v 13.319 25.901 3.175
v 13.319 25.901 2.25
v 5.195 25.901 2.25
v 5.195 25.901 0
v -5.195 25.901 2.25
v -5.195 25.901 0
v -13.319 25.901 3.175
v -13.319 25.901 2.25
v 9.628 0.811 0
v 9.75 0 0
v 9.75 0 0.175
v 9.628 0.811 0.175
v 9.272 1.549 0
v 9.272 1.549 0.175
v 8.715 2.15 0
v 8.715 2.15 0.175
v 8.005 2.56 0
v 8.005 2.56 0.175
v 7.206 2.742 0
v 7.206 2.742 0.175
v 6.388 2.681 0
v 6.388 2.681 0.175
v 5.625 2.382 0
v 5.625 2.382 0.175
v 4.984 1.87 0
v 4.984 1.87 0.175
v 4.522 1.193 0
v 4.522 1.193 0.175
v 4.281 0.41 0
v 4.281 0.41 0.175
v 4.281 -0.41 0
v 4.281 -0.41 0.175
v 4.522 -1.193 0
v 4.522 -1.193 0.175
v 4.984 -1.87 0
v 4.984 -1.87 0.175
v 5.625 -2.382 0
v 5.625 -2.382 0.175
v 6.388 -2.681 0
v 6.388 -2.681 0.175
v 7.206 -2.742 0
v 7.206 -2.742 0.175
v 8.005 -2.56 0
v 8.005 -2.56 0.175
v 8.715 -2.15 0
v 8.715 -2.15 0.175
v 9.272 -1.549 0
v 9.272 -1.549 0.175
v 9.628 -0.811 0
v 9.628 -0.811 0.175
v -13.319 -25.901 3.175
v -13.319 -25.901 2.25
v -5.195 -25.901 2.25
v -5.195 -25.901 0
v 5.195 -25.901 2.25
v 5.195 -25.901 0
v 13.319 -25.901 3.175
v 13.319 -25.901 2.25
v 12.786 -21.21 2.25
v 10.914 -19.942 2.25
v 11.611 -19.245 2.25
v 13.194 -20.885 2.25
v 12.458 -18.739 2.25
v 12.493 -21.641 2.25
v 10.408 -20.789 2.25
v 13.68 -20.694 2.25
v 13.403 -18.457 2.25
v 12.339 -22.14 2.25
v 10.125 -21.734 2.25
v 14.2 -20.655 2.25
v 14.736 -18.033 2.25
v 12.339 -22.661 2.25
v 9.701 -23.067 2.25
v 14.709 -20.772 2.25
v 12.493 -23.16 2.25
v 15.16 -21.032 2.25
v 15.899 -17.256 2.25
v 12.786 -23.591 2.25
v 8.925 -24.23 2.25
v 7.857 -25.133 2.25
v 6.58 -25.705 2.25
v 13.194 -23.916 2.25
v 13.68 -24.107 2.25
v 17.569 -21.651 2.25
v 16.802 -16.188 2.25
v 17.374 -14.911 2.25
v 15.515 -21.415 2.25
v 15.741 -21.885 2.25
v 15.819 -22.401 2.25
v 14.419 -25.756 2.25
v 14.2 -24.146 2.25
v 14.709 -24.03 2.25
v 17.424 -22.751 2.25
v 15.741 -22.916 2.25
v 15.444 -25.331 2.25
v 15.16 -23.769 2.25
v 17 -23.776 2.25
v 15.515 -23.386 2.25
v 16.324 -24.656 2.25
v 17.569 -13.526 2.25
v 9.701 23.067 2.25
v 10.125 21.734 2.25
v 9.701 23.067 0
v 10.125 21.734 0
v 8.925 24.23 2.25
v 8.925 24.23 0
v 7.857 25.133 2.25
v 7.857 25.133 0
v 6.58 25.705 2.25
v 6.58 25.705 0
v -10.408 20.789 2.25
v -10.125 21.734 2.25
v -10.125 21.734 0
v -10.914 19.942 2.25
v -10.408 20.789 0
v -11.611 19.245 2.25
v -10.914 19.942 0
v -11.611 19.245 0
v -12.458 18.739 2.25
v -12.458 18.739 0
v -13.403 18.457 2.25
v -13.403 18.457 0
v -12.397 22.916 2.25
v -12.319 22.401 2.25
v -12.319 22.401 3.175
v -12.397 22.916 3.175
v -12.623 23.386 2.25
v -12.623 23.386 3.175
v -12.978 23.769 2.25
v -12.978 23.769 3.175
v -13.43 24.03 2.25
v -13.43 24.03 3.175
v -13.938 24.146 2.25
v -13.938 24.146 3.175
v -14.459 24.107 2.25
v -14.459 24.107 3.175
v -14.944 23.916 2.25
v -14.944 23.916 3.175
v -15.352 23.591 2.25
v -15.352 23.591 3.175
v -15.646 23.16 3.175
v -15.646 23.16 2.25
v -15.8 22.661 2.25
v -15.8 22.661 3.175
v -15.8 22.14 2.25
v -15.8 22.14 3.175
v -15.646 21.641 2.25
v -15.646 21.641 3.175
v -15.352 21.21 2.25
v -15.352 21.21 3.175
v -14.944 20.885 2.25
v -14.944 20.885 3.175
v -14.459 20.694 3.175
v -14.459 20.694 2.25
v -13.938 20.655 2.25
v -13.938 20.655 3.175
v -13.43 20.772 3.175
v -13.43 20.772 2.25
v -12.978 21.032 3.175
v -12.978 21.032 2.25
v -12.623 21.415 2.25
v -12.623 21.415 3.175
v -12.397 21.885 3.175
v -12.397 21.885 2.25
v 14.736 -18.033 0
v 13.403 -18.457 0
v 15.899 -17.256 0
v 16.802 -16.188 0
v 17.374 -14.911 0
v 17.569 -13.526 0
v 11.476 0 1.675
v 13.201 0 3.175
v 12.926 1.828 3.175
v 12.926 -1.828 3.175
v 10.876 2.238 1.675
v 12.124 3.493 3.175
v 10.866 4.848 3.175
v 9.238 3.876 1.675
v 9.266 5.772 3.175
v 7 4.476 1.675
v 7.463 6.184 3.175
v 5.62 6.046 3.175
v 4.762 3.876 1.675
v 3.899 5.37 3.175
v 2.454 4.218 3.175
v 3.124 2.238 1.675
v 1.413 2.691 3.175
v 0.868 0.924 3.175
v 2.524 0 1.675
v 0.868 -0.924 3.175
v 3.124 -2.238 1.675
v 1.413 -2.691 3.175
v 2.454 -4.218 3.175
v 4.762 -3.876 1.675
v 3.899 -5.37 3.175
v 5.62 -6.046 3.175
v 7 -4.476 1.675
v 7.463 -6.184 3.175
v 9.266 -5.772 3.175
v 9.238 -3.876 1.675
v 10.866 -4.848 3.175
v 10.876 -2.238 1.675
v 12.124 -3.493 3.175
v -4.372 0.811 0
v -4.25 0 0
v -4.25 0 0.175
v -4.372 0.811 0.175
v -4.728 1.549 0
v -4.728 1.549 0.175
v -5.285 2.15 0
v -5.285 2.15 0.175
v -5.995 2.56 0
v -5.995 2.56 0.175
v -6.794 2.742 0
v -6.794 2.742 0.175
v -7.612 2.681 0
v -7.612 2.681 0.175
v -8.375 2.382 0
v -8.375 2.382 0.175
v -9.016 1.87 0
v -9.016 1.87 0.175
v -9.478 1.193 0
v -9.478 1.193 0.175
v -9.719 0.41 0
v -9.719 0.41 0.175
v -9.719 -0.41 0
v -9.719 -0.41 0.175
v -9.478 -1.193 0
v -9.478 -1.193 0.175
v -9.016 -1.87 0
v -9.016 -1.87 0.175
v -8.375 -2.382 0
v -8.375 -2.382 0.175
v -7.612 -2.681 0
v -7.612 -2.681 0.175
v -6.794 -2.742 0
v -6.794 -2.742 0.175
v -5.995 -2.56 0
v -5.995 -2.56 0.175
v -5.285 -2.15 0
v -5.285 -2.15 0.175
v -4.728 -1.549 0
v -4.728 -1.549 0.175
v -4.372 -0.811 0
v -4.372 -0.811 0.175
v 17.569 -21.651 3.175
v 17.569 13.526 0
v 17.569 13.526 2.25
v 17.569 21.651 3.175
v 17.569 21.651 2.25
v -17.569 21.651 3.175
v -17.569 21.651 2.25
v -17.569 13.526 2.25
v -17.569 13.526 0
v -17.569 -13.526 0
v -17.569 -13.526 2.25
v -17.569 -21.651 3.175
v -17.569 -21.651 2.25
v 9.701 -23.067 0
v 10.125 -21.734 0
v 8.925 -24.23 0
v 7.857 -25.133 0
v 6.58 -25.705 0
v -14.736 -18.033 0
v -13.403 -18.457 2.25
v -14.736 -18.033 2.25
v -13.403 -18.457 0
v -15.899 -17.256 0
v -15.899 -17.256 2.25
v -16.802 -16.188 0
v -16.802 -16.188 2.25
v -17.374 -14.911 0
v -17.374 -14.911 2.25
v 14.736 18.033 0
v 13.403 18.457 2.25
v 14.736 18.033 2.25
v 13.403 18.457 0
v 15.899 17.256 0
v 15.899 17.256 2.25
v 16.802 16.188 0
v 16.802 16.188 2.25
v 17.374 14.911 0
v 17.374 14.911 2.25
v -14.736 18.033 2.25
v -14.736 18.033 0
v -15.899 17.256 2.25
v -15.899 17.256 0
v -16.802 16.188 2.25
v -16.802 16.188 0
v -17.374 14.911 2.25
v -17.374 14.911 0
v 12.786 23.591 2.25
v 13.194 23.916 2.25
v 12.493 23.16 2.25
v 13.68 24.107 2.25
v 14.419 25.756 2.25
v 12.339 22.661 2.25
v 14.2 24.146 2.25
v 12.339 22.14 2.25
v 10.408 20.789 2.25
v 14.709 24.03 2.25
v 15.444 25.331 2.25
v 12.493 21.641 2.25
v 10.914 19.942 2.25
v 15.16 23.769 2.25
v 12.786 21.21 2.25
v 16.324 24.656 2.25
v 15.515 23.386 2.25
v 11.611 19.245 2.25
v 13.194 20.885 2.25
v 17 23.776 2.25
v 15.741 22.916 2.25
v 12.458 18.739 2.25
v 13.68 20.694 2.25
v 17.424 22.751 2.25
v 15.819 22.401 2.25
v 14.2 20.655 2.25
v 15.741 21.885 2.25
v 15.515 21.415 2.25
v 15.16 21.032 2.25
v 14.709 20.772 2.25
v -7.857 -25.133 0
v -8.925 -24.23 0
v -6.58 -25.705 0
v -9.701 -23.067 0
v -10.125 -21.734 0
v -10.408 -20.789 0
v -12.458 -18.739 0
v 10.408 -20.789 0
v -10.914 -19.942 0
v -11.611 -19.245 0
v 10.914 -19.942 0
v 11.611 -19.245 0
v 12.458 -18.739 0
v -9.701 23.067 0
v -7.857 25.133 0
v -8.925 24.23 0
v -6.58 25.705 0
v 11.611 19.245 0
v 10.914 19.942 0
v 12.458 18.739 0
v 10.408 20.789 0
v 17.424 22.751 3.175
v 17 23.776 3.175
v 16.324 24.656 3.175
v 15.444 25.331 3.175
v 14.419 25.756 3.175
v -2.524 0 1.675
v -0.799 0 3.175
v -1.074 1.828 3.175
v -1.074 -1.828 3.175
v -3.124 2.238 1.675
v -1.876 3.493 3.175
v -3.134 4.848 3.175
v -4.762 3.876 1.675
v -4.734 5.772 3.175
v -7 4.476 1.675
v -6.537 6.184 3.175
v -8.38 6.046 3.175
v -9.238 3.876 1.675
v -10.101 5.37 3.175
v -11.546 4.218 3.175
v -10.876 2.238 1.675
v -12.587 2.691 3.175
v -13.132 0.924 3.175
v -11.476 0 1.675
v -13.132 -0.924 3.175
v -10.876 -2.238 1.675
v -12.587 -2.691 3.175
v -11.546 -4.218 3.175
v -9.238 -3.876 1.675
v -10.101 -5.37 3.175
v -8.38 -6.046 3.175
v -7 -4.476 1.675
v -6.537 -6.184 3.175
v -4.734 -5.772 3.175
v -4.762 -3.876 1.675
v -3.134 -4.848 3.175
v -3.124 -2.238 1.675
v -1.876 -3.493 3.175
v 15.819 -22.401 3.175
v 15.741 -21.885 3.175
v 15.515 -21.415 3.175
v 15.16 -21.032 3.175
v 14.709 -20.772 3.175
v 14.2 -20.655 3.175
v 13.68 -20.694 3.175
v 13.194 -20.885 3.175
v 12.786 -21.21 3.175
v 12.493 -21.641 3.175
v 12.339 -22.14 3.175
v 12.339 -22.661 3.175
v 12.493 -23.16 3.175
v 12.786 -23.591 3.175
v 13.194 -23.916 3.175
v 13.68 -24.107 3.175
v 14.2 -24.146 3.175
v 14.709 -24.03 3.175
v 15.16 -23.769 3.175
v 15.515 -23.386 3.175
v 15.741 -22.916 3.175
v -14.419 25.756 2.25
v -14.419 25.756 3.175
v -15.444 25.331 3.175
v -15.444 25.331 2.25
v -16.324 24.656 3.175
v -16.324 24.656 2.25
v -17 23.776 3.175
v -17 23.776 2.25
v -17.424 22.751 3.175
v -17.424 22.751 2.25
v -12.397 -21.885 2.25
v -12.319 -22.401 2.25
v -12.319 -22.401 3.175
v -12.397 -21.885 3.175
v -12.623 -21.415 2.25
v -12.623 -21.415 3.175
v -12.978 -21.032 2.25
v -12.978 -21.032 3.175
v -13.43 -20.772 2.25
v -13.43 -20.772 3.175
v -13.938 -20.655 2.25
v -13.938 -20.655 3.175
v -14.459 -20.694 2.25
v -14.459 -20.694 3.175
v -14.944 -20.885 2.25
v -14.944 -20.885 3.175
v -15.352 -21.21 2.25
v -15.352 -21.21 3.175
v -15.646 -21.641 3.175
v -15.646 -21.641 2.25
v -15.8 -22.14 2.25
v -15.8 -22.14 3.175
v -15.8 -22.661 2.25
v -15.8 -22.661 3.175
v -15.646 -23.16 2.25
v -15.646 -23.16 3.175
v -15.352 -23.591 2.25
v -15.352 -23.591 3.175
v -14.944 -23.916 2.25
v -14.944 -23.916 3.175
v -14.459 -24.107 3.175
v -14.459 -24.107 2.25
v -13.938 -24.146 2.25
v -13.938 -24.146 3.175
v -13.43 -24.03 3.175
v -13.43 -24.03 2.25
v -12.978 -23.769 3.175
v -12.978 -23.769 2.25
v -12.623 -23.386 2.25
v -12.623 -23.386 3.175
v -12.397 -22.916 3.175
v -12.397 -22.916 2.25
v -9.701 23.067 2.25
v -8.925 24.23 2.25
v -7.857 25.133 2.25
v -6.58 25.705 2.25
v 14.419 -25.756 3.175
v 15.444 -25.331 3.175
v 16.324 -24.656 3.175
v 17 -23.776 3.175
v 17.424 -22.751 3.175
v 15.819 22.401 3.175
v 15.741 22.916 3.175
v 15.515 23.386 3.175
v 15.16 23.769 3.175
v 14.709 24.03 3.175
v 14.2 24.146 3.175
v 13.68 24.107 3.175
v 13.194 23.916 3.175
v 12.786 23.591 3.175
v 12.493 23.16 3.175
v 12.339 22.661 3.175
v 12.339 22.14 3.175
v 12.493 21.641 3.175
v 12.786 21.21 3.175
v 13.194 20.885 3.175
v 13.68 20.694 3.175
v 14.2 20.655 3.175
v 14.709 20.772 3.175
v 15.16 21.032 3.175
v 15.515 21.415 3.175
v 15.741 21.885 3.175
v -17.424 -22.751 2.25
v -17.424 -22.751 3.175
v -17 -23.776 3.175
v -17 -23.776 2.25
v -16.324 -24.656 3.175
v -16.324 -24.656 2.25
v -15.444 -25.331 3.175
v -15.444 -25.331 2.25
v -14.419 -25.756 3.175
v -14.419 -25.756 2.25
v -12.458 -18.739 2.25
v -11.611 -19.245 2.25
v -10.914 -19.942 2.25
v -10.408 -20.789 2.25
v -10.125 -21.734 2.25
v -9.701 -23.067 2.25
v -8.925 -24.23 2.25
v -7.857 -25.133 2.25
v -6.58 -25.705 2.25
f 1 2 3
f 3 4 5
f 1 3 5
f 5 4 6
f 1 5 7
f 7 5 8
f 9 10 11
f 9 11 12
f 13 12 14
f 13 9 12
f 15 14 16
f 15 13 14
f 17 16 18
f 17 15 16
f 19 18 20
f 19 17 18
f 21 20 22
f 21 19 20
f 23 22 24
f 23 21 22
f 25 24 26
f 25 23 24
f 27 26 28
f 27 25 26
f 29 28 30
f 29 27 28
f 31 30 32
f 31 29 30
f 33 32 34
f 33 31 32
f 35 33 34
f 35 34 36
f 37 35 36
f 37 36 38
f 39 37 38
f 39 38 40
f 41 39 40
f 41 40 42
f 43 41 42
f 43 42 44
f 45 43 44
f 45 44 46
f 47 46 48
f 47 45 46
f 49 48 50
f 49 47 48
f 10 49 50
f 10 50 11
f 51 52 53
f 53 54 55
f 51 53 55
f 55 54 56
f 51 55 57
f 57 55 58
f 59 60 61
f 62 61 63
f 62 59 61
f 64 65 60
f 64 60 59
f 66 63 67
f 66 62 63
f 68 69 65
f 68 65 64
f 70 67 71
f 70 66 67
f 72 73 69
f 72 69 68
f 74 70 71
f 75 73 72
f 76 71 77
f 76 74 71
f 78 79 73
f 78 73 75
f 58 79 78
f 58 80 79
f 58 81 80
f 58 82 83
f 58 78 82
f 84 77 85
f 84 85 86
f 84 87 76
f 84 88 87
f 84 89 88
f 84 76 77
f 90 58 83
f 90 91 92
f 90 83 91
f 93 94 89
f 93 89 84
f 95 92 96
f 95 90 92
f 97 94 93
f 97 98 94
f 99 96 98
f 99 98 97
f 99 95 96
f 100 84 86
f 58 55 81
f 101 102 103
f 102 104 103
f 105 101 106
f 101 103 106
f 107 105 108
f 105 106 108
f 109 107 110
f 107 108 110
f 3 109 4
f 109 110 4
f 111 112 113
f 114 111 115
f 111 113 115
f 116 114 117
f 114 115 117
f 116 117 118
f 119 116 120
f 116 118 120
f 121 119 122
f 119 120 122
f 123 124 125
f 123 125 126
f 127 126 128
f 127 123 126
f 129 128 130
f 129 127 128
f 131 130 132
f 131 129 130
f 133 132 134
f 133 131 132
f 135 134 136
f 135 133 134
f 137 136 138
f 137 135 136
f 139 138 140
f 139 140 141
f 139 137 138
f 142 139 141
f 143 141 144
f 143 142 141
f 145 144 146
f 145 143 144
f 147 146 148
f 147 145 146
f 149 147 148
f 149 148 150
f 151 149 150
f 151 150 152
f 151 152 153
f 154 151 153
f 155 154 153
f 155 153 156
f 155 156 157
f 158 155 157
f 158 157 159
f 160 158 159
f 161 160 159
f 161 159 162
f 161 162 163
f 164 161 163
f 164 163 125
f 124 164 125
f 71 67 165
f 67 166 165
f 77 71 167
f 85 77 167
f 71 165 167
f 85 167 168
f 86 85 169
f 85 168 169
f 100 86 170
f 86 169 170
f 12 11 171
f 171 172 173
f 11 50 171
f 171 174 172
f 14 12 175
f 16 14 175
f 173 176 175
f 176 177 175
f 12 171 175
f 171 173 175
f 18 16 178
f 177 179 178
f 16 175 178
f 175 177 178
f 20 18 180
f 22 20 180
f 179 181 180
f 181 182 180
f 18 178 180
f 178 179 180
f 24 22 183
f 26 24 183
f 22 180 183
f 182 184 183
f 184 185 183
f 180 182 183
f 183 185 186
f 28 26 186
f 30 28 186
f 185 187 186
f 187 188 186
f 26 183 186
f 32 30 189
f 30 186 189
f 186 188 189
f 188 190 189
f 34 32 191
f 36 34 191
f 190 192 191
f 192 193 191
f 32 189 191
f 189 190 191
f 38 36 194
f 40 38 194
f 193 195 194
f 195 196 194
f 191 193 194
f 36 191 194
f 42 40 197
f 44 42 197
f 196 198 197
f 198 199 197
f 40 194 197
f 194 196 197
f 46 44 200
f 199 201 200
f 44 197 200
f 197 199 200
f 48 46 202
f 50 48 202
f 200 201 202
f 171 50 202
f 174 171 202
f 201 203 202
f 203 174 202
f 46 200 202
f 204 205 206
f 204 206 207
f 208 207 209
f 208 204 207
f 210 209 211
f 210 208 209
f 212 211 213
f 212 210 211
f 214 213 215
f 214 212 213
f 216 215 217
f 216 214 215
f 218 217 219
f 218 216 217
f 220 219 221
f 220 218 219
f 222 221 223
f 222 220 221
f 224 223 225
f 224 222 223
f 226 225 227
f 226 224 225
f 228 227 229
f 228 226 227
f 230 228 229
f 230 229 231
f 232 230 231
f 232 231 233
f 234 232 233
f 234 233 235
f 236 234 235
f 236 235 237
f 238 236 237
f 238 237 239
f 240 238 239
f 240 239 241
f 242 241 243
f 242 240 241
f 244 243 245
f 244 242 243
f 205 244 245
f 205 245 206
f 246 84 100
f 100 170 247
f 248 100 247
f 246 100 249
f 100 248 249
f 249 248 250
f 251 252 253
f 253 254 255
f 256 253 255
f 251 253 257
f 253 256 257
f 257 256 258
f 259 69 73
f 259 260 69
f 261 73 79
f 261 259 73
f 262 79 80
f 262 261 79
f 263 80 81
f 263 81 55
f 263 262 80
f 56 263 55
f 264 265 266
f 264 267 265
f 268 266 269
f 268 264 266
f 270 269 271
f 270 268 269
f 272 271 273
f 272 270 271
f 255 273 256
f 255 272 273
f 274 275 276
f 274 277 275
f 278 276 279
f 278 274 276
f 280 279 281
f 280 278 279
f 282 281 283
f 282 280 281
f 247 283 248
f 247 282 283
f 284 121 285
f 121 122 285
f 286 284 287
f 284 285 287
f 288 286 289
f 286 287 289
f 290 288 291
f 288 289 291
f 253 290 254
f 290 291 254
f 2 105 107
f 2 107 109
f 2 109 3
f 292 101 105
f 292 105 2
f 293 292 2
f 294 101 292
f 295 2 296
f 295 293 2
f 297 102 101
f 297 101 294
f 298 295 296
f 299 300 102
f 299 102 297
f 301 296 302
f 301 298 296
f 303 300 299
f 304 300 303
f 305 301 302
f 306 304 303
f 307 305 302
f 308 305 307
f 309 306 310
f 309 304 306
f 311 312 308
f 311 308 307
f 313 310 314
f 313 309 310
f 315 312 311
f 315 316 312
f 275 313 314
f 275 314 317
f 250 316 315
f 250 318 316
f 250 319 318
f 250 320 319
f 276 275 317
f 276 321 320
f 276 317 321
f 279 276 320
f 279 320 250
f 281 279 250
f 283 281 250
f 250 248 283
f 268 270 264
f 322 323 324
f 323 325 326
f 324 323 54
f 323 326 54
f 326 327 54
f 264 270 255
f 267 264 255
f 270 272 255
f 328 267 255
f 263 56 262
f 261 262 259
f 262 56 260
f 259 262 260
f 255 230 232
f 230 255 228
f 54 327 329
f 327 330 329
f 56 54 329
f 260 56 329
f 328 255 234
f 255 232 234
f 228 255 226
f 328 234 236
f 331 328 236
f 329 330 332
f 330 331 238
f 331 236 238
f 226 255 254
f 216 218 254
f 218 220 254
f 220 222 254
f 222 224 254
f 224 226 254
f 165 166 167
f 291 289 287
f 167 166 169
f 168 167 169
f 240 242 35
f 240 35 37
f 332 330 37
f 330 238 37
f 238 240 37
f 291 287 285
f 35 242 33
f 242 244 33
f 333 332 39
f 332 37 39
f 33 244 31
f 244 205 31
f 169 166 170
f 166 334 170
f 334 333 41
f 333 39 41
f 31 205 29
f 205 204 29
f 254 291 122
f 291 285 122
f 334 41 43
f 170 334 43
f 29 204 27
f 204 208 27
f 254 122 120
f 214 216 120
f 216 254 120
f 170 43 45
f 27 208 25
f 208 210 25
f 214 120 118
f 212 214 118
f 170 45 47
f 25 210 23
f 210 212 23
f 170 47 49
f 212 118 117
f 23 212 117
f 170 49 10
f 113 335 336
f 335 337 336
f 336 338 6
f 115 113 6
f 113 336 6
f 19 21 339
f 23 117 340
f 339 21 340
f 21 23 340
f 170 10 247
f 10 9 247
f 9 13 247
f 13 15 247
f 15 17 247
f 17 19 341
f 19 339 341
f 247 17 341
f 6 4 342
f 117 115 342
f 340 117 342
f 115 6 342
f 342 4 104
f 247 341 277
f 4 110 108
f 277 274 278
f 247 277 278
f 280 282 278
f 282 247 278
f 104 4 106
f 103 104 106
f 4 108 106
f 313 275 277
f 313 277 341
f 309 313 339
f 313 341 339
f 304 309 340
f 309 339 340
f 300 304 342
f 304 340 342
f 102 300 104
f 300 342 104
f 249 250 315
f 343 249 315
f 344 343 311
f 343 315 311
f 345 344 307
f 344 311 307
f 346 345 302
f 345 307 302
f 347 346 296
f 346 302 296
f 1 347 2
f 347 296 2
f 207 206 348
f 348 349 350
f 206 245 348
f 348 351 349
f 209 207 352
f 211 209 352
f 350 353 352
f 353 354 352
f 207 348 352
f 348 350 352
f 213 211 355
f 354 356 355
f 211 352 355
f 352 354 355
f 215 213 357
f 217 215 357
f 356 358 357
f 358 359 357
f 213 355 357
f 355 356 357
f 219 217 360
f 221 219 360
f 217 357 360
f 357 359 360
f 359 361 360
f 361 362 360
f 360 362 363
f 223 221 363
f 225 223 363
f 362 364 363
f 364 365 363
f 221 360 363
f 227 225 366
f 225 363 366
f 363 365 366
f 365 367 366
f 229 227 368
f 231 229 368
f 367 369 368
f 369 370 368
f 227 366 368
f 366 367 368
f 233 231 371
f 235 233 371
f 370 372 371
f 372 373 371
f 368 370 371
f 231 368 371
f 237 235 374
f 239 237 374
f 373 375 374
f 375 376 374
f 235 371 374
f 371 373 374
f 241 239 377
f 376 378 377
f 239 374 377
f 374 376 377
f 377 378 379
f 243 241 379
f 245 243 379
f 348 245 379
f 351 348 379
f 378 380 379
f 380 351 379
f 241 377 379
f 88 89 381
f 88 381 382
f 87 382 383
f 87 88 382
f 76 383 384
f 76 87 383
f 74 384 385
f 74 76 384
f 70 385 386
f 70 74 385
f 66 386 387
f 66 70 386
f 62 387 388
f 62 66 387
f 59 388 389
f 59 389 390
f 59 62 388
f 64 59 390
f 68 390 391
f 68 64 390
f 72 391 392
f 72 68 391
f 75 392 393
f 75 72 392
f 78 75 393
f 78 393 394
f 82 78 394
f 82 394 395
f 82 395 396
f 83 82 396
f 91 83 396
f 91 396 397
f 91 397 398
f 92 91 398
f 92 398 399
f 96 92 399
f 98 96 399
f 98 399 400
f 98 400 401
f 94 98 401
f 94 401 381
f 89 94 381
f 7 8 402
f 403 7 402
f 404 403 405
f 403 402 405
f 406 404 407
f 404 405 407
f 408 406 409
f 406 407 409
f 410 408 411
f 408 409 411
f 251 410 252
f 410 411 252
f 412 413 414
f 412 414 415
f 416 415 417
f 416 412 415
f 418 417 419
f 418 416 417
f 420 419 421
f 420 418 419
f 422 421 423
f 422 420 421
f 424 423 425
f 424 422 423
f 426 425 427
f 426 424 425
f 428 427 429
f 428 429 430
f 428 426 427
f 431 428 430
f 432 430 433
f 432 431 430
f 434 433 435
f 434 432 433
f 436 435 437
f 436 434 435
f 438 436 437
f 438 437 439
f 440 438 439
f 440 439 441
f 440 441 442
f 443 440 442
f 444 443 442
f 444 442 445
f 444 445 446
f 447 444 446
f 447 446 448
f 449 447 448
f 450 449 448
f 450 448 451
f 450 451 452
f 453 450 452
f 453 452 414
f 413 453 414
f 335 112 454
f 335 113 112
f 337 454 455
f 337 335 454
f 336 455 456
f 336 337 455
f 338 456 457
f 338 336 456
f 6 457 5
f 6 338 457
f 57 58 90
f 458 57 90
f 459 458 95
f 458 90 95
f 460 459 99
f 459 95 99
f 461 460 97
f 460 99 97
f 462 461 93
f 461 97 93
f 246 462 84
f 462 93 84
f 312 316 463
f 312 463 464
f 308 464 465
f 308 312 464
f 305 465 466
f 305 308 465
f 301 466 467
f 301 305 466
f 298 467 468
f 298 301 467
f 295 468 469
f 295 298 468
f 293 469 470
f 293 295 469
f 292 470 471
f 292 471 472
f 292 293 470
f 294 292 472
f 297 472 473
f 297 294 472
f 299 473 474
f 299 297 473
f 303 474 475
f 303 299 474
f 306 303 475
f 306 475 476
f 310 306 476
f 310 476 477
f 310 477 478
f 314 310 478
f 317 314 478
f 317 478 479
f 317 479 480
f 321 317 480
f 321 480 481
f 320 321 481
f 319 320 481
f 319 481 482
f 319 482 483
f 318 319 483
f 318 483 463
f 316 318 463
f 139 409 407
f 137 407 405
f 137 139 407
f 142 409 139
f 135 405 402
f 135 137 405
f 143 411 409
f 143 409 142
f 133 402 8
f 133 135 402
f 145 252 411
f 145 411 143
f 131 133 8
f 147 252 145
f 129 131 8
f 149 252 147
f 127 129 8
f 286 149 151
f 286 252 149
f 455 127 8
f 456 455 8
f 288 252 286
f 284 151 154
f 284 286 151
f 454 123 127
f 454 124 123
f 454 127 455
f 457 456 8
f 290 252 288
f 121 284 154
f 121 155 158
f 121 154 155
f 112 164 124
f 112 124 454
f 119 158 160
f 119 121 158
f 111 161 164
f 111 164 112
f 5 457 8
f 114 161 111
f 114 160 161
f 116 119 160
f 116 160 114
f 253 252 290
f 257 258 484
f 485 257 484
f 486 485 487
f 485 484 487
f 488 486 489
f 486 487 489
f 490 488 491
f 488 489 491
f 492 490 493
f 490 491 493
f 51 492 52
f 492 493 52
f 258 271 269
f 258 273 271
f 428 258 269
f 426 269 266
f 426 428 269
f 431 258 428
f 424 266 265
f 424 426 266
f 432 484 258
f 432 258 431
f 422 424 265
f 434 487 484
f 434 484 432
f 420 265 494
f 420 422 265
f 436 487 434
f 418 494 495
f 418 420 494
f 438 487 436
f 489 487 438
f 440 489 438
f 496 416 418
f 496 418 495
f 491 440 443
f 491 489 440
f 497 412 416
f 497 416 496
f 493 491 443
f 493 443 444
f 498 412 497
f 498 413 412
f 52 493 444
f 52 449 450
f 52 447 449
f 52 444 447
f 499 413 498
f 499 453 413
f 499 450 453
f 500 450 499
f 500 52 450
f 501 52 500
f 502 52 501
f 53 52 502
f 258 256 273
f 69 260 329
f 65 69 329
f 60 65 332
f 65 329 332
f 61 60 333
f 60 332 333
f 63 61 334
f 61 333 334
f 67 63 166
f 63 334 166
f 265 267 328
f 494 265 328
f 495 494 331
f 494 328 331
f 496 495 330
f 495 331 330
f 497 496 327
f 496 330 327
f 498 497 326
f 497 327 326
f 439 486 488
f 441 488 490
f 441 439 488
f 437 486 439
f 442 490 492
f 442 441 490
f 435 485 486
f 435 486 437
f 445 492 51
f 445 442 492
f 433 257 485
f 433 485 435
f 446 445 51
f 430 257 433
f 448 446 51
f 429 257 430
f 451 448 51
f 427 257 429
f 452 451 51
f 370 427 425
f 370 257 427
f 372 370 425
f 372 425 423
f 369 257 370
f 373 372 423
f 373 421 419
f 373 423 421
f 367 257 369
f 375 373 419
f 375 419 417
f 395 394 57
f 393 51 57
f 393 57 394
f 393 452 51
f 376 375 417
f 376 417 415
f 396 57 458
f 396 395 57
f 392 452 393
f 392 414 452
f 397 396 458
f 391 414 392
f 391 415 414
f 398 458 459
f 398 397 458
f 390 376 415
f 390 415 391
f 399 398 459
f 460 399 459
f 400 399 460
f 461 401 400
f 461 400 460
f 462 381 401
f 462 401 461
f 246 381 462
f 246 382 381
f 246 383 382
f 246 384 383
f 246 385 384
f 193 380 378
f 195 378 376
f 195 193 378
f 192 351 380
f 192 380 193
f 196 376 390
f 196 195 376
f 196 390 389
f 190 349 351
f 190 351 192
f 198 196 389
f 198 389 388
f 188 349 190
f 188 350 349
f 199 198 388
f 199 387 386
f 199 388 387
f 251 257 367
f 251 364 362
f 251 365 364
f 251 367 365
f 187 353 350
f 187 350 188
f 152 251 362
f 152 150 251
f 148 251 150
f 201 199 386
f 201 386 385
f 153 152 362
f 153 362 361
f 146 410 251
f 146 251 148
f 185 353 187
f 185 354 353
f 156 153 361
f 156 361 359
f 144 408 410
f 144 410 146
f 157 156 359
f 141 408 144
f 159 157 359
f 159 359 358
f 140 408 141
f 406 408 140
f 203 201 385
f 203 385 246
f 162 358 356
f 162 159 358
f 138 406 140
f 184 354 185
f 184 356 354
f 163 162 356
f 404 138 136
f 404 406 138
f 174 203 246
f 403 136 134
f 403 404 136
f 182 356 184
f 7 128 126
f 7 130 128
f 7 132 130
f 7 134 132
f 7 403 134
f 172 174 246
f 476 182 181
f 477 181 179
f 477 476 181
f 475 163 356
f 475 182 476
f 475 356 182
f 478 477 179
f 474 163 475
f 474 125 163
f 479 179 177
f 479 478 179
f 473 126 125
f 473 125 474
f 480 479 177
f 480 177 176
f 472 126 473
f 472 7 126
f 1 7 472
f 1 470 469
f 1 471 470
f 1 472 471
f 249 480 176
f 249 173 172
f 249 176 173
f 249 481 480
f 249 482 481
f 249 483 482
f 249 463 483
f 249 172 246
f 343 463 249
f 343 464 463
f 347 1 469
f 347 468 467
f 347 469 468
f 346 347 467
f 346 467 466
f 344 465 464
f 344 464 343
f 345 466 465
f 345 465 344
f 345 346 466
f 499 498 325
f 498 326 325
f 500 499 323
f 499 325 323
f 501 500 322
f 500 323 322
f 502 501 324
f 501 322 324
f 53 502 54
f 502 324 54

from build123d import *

# Parameters (mm, degrees)
F0_R       = 1.75
F0_R_2     = 2.75
F1_DEPTH   = 3.175
F2_SIZE2   = 3.4511052217
F2_SIZE    = 3
F2_2_SIZE2 = 3.4511052217
F2_2_SIZE  = 3
F3_R       = 4
F4_DEPTH   = 2.25
F5_R       = 5


with BuildPart() as f1:
    # F0 (on Top) → F1 (new body)
    with BuildSketch(Plane.XY):
        with BuildLine():
            ThreePointArc((17.569226806, 21.6505549061), (16.324430626, 24.6557587262), (13.319226806, 25.9005549061))
            Line((13.319226806, 25.9005549061), (-13.319226806, 25.9005549061))
            ThreePointArc((-13.319226806, 25.9005549061), (-16.324430626, 24.6557587262), (-17.569226806, 21.6505549061))
            Line((-17.569226806, 21.6505549061), (-17.569226806, -21.6505549061))
            ThreePointArc((-17.569226806, -21.6505549061), (-16.324430626, -24.6557587262), (-13.319226806, -25.9005549061))
            Line((-13.319226806, -25.9005549061), (13.319226806, -25.9005549061))
            ThreePointArc((13.319226806, -25.9005549061), (16.324430626, -24.6557587262), (17.569226806, -21.6505549061))
            Line((17.569226806, -21.6505549061), (17.569226806, 21.6505549061))
        make_face()
        with Locations((-14.069226806, -22.4005549061)):
            Circle(F0_R, mode=Mode.SUBTRACT)
        with Locations((14.069226806, -22.4005549061)):
            Circle(F0_R, mode=Mode.SUBTRACT)
        with Locations((-7, 0)):
            Circle(F0_R_2, mode=Mode.SUBTRACT)
        with Locations((-14.069226806, 22.4005549061)):
            Circle(F0_R, mode=Mode.SUBTRACT)
        with Locations((7, 0)):
            Circle(F0_R_2, mode=Mode.SUBTRACT)
        with Locations((14.069226806, 22.4005549061)):
            Circle(F0_R, mode=Mode.SUBTRACT)
    extrude(amount=F1_DEPTH)

    # F2
    f2_edges = [f1.edges().sort_by_distance(p)[0] for p in [
        (-9.75, 0, 3.175),
    ]]
    f2_side = f1.faces().sort_by_distance((-9.75, 0, 1.5875))[0]
    chamfer(f2_edges, length=F2_SIZE, length2=F2_SIZE2, reference=f2_side)

    # F2#2
    f2_2_edges = [f1.edges().sort_by_distance(p)[0] for p in [
        (4.25, 0, 3.175),
    ]]
    f2_2_side = f1.faces().sort_by_distance((4.25, 0, 1.5875))[0]
    chamfer(f2_2_edges, length=F2_2_SIZE, length2=F2_2_SIZE2, reference=f2_2_side)

    # F3 (on face) → F4 (cut)
    with BuildSketch(Plane(origin=(0, 0, 0), x_dir=(1, 0, 0), z_dir=(0, 0, -1))):
        with Locations((-14.069226806, 22.4005549061)):
            Circle(F3_R)
        with Locations((14.069226806, 22.4005549061)):
            Circle(F3_R)
        with Locations((-14.069226806, -22.4005549061)):
            Circle(F3_R)
        with Locations((14.069226806, -22.4005549061)):
            Circle(F3_R)
    extrude(amount=-F4_DEPTH, mode=Mode.SUBTRACT)

    # F5
    f5_edges = [f1.edges().sort_by_distance(p)[0] for p in [
        (-12.132735, -25.900555, 1.125),
        (-17.569227, -20.464063, 1.125),
        (12.132735, -25.900555, 1.125),
        (17.569227, -20.464063, 1.125),
        (-17.569227, 20.464063, 1.125),
        (-12.132735, 25.900555, 1.125),
        (12.132735, 25.900555, 1.125),
        (17.569227, 20.464063, 1.125),
    ]]
    fillet(f5_edges, radius=F5_R)


solid = f1.part
